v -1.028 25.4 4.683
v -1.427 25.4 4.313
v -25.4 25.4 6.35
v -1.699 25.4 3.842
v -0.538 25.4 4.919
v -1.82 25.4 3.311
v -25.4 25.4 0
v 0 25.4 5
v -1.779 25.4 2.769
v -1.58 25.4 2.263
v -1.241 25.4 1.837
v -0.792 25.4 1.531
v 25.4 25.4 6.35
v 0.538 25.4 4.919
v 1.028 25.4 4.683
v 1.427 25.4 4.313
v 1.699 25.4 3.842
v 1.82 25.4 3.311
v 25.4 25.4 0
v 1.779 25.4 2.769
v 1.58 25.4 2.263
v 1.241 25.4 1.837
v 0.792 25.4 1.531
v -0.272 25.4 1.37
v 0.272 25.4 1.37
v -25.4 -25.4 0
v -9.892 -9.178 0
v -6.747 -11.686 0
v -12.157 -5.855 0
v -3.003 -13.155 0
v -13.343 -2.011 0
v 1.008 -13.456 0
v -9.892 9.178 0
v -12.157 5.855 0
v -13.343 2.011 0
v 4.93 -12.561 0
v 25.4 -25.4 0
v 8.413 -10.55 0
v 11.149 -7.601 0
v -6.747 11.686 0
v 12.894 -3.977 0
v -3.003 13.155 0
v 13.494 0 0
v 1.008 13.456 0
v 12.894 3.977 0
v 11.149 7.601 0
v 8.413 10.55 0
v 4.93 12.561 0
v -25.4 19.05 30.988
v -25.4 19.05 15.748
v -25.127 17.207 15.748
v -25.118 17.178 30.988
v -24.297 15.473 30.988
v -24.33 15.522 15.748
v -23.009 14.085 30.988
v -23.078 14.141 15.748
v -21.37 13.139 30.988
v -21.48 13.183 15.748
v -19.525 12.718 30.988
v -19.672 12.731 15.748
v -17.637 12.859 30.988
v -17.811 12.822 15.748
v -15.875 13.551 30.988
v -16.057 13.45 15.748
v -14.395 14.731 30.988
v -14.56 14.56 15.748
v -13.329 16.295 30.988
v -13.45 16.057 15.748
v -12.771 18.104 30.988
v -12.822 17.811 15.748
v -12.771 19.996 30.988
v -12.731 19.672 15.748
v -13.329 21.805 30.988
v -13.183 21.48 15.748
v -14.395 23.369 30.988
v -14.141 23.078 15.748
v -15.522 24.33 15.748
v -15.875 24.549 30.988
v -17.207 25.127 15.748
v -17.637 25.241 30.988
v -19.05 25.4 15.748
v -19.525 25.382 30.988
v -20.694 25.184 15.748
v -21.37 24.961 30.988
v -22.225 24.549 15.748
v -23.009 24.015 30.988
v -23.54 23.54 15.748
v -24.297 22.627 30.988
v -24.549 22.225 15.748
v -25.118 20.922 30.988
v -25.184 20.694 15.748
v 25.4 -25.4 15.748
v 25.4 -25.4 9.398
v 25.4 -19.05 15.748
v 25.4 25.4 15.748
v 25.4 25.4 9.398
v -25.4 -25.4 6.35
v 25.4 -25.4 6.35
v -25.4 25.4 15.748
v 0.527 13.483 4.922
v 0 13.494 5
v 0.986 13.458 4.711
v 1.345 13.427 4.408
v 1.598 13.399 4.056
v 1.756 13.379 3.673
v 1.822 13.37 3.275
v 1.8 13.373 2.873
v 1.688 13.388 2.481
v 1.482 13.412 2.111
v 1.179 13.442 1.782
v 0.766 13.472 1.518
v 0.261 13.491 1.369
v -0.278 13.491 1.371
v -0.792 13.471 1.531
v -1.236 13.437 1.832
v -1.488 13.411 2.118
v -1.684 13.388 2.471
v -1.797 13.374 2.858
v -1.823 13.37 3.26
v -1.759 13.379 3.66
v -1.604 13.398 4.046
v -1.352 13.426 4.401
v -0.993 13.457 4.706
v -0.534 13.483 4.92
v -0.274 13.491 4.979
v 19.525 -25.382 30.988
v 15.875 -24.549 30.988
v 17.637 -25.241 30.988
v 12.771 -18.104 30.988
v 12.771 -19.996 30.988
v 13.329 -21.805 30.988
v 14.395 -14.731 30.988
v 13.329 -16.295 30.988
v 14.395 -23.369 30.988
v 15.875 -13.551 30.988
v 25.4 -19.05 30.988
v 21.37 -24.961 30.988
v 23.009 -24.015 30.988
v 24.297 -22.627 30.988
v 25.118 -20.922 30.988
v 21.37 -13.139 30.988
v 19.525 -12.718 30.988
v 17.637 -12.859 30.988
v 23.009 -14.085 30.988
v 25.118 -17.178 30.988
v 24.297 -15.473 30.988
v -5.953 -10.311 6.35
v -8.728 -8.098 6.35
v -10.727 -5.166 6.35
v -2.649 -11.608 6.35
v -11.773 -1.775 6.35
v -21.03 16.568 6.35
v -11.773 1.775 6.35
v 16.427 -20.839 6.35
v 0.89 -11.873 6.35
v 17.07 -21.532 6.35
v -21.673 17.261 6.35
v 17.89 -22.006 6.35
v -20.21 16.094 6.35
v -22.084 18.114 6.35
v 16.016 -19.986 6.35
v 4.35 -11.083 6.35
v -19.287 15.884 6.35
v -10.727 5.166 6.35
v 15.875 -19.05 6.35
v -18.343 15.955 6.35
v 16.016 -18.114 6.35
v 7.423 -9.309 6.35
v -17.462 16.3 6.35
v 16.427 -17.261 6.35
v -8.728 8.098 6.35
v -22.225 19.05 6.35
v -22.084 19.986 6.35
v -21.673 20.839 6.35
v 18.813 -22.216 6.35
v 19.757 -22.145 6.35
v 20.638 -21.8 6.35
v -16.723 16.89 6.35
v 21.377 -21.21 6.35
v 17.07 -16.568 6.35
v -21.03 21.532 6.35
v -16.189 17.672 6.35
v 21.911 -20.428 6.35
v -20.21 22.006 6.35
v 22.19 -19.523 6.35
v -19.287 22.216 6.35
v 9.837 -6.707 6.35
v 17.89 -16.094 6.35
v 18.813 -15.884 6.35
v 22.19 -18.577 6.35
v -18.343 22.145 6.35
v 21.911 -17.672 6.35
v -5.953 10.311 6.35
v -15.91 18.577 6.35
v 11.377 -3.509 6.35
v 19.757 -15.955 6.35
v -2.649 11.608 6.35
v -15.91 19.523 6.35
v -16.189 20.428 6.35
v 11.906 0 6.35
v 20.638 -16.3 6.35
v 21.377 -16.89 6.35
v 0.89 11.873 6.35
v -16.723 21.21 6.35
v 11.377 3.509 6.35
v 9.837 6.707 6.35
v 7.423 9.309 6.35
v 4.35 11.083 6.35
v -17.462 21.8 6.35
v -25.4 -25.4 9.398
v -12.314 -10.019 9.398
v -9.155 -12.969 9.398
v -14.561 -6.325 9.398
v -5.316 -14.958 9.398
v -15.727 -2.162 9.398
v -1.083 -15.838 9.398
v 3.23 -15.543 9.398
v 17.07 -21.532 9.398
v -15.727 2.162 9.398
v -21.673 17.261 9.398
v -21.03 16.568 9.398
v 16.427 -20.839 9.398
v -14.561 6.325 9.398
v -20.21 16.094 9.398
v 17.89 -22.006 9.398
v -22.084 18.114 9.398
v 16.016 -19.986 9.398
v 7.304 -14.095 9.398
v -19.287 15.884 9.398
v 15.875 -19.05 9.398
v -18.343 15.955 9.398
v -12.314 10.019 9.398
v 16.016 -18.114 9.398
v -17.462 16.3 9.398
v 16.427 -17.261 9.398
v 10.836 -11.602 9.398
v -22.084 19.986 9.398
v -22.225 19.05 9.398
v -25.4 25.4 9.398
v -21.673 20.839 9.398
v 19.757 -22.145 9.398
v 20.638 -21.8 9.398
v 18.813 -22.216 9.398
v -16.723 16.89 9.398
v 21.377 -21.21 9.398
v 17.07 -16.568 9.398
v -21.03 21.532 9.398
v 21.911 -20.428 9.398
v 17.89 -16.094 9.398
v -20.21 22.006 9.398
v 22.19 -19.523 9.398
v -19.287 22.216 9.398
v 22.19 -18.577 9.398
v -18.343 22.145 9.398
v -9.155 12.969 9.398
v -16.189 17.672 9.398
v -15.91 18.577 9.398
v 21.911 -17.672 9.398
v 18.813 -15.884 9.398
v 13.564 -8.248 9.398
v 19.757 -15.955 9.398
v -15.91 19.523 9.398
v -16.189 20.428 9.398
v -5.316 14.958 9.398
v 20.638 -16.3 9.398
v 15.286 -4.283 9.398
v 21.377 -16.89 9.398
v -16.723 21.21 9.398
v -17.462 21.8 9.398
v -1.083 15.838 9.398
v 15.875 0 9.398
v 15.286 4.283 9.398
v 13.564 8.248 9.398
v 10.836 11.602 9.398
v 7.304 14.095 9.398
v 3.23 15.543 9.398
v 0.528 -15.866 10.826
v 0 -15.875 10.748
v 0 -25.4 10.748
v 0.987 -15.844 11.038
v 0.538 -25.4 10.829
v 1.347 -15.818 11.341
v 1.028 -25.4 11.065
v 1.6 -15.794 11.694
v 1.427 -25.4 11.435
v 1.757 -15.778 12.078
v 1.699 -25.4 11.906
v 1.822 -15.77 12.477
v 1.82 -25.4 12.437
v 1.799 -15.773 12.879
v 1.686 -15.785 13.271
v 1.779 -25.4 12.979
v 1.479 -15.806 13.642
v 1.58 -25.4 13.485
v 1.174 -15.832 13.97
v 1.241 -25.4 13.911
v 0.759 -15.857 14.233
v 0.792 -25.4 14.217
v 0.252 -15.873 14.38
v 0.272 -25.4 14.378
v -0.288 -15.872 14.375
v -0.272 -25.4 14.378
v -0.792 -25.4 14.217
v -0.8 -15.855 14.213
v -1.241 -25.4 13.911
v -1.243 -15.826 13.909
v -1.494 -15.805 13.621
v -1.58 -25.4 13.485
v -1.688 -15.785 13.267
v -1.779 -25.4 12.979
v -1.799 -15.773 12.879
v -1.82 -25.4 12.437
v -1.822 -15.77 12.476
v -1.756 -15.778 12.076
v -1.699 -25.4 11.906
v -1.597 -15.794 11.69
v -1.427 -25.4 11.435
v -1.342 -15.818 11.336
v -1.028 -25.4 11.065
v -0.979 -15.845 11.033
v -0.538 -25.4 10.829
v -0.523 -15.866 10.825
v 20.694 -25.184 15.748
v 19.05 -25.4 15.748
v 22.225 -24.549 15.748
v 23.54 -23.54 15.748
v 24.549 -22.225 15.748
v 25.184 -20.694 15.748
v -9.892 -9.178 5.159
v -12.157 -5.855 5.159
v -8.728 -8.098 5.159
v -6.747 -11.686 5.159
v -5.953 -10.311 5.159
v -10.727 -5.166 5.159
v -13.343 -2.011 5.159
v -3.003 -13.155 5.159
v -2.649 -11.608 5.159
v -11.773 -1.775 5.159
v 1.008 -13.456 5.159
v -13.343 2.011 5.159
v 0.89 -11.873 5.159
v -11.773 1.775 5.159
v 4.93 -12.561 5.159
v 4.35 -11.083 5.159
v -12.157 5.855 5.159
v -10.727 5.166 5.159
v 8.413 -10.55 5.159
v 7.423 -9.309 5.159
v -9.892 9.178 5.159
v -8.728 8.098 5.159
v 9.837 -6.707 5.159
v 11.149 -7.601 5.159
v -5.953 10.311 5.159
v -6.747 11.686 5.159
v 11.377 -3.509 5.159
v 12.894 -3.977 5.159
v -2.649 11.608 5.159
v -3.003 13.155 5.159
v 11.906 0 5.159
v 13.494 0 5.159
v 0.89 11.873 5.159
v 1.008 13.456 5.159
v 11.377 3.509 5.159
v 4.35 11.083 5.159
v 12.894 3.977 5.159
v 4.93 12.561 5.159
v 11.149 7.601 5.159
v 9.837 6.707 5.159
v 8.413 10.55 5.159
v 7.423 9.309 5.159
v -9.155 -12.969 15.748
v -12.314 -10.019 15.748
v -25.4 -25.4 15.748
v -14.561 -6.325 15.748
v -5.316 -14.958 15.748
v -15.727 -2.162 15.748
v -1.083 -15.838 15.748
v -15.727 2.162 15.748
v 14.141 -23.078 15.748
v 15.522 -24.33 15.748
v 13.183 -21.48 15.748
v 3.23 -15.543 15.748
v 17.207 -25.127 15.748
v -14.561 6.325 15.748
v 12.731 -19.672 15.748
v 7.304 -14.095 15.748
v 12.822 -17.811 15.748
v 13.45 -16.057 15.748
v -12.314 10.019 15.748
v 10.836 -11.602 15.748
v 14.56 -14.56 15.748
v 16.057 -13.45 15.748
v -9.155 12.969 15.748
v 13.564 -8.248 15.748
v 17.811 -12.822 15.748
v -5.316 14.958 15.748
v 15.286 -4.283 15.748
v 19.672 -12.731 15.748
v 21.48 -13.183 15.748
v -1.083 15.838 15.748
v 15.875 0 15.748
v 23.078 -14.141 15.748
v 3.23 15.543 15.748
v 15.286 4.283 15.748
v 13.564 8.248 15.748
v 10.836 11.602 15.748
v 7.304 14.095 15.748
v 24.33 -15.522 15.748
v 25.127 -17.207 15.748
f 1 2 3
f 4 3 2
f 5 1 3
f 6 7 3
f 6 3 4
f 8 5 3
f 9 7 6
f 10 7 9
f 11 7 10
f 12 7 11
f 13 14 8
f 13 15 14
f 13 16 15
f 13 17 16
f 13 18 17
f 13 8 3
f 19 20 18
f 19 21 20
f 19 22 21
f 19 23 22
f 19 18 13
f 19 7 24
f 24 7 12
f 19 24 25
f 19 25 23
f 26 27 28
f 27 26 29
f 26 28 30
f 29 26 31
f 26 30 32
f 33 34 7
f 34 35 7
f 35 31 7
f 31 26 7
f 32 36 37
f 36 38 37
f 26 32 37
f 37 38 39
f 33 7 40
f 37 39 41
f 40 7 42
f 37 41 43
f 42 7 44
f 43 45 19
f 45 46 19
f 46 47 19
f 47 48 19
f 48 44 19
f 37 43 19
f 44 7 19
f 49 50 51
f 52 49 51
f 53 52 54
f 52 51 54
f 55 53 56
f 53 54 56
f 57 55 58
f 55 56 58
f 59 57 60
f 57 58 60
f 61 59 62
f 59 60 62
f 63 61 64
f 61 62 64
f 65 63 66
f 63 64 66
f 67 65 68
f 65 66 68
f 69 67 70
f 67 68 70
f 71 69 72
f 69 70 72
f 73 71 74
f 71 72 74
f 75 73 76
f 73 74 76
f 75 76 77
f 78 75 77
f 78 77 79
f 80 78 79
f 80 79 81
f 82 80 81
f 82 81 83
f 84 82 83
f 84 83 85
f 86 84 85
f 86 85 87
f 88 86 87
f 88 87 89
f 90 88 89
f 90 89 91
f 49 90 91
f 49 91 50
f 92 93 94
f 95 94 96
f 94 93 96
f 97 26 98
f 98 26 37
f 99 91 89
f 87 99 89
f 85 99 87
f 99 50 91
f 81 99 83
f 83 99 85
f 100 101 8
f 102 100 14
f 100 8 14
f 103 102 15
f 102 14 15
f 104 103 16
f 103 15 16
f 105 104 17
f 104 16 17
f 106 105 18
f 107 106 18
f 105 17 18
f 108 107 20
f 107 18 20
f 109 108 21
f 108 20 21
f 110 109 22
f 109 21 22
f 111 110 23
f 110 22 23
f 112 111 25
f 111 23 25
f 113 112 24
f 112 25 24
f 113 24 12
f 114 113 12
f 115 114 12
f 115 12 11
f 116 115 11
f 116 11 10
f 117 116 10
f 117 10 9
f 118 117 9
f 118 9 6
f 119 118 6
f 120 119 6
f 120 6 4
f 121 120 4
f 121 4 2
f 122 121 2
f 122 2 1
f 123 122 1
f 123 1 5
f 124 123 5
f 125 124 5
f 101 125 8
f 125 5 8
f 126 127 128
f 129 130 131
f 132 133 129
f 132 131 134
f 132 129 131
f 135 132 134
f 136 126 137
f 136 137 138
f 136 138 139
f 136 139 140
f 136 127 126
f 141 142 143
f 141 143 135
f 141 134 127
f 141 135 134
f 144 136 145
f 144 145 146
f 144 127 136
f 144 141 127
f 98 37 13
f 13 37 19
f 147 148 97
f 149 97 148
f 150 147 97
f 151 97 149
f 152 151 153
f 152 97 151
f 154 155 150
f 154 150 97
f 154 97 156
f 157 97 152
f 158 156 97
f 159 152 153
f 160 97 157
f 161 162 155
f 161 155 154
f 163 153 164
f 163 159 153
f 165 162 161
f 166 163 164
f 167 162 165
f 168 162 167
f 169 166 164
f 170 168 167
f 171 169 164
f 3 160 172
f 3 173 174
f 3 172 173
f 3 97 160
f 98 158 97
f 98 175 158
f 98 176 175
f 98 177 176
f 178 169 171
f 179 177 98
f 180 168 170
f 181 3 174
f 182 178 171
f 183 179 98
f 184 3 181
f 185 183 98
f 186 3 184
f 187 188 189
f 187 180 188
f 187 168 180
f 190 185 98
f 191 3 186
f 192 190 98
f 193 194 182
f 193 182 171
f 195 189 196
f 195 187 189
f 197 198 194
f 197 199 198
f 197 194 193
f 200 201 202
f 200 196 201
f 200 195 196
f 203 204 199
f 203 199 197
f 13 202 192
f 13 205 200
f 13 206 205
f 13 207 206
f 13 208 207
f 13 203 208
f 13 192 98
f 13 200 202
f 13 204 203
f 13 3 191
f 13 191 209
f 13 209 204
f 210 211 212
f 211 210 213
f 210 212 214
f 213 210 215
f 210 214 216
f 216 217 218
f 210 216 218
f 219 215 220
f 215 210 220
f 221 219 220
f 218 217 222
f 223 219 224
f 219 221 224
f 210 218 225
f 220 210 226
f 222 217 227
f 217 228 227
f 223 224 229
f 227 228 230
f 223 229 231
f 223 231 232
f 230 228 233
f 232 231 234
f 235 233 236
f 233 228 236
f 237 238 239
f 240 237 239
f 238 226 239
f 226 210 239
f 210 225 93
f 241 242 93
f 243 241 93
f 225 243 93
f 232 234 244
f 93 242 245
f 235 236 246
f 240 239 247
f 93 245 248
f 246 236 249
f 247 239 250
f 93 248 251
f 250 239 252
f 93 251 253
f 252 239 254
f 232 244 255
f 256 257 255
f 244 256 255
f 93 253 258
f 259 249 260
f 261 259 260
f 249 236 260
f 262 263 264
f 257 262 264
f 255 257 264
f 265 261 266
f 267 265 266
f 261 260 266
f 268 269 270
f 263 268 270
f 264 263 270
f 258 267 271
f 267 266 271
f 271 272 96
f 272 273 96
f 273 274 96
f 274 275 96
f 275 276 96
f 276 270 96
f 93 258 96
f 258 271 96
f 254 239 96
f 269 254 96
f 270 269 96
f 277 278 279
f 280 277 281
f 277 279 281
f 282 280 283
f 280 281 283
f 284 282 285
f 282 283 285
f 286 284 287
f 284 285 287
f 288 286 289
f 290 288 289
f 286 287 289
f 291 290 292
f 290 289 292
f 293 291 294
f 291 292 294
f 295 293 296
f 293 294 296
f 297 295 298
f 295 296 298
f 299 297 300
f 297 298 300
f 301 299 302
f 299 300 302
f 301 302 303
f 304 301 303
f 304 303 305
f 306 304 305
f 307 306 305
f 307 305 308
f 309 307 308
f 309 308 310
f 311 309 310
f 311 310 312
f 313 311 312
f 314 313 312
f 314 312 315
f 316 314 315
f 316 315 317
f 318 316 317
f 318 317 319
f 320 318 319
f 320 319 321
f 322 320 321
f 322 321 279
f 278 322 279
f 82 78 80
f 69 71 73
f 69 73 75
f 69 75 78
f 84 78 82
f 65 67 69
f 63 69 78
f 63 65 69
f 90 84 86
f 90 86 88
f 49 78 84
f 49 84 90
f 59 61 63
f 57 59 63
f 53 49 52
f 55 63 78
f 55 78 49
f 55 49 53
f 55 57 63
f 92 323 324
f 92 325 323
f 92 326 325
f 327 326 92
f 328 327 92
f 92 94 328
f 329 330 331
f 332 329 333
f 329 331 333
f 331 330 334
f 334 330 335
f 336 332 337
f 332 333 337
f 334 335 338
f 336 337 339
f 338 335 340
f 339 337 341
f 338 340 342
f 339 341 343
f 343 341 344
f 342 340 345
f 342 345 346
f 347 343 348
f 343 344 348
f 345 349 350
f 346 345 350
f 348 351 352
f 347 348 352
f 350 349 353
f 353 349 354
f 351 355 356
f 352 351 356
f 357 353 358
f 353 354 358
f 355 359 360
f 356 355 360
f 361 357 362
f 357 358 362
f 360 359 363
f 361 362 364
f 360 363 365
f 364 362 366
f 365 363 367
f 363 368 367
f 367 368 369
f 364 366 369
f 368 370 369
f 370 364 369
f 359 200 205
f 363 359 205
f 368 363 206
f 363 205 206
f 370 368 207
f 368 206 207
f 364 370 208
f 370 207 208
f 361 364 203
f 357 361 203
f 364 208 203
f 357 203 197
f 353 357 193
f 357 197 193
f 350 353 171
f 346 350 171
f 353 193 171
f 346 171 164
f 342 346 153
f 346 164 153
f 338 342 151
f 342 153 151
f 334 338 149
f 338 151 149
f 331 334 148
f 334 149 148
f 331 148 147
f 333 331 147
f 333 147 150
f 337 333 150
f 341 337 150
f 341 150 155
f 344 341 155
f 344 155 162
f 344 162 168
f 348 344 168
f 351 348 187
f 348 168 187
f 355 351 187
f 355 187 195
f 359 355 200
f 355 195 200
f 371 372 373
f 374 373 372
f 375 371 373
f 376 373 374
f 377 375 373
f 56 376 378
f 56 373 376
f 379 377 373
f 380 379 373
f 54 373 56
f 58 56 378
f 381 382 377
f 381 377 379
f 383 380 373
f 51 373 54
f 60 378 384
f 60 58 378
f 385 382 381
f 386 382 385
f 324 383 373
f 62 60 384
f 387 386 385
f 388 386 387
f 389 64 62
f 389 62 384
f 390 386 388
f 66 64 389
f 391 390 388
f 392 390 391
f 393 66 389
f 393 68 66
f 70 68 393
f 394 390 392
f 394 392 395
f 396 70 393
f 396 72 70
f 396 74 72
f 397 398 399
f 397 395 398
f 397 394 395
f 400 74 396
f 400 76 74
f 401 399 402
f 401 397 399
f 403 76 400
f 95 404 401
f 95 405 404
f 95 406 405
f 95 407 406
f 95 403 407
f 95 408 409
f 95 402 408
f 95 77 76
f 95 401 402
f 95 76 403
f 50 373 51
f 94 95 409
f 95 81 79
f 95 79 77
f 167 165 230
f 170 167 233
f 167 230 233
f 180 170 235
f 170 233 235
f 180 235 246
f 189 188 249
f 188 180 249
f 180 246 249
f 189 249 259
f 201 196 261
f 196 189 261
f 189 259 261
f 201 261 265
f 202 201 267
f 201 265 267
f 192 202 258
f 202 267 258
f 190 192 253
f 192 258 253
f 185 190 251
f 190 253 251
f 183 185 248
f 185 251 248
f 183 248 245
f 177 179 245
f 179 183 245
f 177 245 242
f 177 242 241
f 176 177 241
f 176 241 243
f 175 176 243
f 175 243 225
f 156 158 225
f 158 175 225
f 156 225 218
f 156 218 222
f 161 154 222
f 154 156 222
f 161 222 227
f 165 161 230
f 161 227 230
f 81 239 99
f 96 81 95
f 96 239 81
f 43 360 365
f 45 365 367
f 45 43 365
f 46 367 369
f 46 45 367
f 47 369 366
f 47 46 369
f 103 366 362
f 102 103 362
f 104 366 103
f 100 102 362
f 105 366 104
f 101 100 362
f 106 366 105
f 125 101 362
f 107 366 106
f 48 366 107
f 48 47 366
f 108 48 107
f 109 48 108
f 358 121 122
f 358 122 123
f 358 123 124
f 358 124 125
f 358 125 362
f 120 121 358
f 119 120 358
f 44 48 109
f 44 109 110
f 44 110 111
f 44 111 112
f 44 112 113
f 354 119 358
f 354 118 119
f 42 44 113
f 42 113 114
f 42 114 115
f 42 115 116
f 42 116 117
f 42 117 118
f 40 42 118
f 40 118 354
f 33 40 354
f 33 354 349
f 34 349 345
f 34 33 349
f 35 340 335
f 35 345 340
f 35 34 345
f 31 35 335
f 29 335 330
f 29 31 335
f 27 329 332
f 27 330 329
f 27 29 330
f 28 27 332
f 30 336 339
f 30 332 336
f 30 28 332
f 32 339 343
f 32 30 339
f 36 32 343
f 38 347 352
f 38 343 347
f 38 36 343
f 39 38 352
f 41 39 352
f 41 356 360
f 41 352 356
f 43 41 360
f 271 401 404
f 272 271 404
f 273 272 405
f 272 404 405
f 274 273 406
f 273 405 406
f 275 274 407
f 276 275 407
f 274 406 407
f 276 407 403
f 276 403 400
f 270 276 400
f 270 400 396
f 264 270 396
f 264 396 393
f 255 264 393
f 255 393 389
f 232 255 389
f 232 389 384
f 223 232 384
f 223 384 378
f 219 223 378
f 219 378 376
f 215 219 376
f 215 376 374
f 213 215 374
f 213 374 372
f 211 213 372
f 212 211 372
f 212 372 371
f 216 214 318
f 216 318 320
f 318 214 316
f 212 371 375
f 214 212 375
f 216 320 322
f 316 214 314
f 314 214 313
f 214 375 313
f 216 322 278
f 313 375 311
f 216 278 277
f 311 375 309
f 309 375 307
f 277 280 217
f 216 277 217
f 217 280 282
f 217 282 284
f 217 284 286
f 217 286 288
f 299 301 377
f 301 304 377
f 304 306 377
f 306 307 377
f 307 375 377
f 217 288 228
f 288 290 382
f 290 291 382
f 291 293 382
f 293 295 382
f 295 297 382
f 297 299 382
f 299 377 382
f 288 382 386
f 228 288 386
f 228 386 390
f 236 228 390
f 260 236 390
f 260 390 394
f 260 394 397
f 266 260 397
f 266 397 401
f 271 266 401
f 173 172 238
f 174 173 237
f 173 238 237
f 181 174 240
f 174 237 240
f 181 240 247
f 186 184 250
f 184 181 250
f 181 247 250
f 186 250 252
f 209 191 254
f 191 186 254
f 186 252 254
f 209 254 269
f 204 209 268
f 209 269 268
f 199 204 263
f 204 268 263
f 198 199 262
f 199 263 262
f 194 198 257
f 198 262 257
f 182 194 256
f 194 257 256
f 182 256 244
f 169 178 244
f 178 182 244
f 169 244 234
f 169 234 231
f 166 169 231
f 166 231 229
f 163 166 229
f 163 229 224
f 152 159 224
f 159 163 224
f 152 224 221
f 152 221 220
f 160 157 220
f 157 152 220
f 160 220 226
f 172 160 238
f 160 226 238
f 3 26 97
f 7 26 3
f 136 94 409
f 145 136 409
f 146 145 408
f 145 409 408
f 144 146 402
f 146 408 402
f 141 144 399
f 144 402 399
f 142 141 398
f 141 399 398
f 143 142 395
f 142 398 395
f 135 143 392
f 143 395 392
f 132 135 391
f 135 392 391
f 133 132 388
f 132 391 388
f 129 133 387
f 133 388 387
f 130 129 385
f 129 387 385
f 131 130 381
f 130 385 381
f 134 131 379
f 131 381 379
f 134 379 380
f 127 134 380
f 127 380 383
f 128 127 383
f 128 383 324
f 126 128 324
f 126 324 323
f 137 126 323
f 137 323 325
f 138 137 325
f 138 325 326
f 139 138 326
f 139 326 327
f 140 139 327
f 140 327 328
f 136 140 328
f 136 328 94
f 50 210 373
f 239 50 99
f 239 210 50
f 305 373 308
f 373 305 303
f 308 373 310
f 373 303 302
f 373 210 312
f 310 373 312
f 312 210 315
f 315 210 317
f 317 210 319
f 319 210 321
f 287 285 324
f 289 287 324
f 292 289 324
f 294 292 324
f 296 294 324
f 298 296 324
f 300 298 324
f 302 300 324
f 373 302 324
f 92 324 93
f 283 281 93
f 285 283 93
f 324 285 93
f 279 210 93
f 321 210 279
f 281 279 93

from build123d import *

# Parameters (mm, degrees)
SKETCH1_W               = 50.8
SKETCH1_H               = 50.8
SKETCH1_R               = 13.49375
BOSS_EXTRUDE1_DEPTH     = 6.35
LPATTERN2_COUNT         = 2
LPATTERN2_PITCH         = 9.398
SKETCH2_W               = 50.8
SKETCH2_H               = 50.8
SKETCH2_R               = 11.90625
BOSS_EXTRUDE2_DEPTH     = 1.190625
SKETCH3_R               = 1.82499
CUT_EXTRUDE1_DEPTH      = 19.05
SKETCH5_R               = 15.875
CUT_EXTRUDE2_DEPTH      = 6.35
CUT_EXTRUDE3_REACH      = 60.939
CUT_EXTRUDE3_END_RADIUS = 15.875
SKETCH6_R               = 1.82499
SKETCH7_R               = 6.35
BOSS_EXTRUDE3_DEPTH     = 15.24
SKETCH8_R               = 3.175
BOSS_EXTRUDE4_DEPTH     = 9.398


with BuildPart() as part:
    # Sketch1 → Boss-Extrude1 (new body)
    with BuildSketch(Plane.XY):
        Rectangle(SKETCH1_W, SKETCH1_H)
        Circle(SKETCH1_R, mode=Mode.SUBTRACT)
    extrude(amount=BOSS_EXTRUDE1_DEPTH)


with BuildPart() as lpattern2_1:
    # LPattern2: pattern copy
    add(part.part.moved(Location(Vector(0, 0, 1) * (1 * LPATTERN2_PITCH))))

    # Sketch5 → Cut-Extrude2 (cut)
    with BuildSketch(Plane.XY.offset(15.748)):
        Circle(SKETCH5_R)
    extrude(amount=-CUT_EXTRUDE2_DEPTH, mode=Mode.SUBTRACT)

    # Cut-Extrude3: up to this cylinder (the profile starts outside it)
    cut_extrude3_end = Plane(origin=(0, 0, 12.573), z_dir=(0, 0, 1)) * Cylinder(CUT_EXTRUDE3_END_RADIUS, 154.628, mode=Mode.PRIVATE)
    # Sketch6 → Cut-Extrude3 (cut, up to the surface)
    with BuildSketch(Plane.XZ.offset(25.4), mode=Mode.PRIVATE) as cut_extrude3_sk1:
        with Locations(Location((0, 12.573, 0), (0, 0, 270))):
            Circle(SKETCH6_R)
    cut_extrude3_tool1 = extrude(cut_extrude3_sk1.sketch, amount=-CUT_EXTRUDE3_REACH, mode=Mode.PRIVATE) - cut_extrude3_end
    add(cut_extrude3_tool1.solids().sort_by_distance((0, -25.4, 12.573))[0], mode=Mode.SUBTRACT)

    # Sketch7 → Boss-Extrude3 (add)
    with BuildSketch(Plane.XY.offset(15.748)):
        with Locations((19.05, -19.05)):
            Circle(SKETCH7_R)
        with Locations(Location((-19.05, 19.05, 0), (0, 0, 180))):
            Circle(SKETCH7_R)
    extrude(amount=BOSS_EXTRUDE3_DEPTH)


with BuildPart() as part_1:
    add(part.part)

    # Sketch2 → Boss-Extrude2 (add)
    with BuildSketch(Plane.XY.offset(6.35)):
        Rectangle(SKETCH2_W, SKETCH2_H)
        Circle(SKETCH2_R, mode=Mode.SUBTRACT)
    extrude(amount=-BOSS_EXTRUDE2_DEPTH)

    # Sketch3 → Cut-Extrude1 (cut)
    with BuildSketch(Plane(origin=(0, 25.4, 0), x_dir=(1, 0, 0), z_dir=(0, 1, 0))):
        with Locations(Location((0, -3.175, 0), (0, 0, 270))):
            Circle(SKETCH3_R)
    extrude(amount=-CUT_EXTRUDE1_DEPTH, mode=Mode.SUBTRACT)

    add(lpattern2_1.part)  # Boss-Extrude4 merges LPattern2_1
    # Sketch8 → Boss-Extrude4 (add)
    with BuildSketch(Plane(origin=(0, 0, 9.398), x_dir=(-1, 0, 0), z_dir=(0, 0, -1))):
        with Locations((-19.05, -19.05)):
            Circle(SKETCH8_R)
        with Locations((19.05, 19.05)):
            Circle(SKETCH8_R)
    extrude(amount=BOSS_EXTRUDE4_DEPTH)


solid = part_1.part
